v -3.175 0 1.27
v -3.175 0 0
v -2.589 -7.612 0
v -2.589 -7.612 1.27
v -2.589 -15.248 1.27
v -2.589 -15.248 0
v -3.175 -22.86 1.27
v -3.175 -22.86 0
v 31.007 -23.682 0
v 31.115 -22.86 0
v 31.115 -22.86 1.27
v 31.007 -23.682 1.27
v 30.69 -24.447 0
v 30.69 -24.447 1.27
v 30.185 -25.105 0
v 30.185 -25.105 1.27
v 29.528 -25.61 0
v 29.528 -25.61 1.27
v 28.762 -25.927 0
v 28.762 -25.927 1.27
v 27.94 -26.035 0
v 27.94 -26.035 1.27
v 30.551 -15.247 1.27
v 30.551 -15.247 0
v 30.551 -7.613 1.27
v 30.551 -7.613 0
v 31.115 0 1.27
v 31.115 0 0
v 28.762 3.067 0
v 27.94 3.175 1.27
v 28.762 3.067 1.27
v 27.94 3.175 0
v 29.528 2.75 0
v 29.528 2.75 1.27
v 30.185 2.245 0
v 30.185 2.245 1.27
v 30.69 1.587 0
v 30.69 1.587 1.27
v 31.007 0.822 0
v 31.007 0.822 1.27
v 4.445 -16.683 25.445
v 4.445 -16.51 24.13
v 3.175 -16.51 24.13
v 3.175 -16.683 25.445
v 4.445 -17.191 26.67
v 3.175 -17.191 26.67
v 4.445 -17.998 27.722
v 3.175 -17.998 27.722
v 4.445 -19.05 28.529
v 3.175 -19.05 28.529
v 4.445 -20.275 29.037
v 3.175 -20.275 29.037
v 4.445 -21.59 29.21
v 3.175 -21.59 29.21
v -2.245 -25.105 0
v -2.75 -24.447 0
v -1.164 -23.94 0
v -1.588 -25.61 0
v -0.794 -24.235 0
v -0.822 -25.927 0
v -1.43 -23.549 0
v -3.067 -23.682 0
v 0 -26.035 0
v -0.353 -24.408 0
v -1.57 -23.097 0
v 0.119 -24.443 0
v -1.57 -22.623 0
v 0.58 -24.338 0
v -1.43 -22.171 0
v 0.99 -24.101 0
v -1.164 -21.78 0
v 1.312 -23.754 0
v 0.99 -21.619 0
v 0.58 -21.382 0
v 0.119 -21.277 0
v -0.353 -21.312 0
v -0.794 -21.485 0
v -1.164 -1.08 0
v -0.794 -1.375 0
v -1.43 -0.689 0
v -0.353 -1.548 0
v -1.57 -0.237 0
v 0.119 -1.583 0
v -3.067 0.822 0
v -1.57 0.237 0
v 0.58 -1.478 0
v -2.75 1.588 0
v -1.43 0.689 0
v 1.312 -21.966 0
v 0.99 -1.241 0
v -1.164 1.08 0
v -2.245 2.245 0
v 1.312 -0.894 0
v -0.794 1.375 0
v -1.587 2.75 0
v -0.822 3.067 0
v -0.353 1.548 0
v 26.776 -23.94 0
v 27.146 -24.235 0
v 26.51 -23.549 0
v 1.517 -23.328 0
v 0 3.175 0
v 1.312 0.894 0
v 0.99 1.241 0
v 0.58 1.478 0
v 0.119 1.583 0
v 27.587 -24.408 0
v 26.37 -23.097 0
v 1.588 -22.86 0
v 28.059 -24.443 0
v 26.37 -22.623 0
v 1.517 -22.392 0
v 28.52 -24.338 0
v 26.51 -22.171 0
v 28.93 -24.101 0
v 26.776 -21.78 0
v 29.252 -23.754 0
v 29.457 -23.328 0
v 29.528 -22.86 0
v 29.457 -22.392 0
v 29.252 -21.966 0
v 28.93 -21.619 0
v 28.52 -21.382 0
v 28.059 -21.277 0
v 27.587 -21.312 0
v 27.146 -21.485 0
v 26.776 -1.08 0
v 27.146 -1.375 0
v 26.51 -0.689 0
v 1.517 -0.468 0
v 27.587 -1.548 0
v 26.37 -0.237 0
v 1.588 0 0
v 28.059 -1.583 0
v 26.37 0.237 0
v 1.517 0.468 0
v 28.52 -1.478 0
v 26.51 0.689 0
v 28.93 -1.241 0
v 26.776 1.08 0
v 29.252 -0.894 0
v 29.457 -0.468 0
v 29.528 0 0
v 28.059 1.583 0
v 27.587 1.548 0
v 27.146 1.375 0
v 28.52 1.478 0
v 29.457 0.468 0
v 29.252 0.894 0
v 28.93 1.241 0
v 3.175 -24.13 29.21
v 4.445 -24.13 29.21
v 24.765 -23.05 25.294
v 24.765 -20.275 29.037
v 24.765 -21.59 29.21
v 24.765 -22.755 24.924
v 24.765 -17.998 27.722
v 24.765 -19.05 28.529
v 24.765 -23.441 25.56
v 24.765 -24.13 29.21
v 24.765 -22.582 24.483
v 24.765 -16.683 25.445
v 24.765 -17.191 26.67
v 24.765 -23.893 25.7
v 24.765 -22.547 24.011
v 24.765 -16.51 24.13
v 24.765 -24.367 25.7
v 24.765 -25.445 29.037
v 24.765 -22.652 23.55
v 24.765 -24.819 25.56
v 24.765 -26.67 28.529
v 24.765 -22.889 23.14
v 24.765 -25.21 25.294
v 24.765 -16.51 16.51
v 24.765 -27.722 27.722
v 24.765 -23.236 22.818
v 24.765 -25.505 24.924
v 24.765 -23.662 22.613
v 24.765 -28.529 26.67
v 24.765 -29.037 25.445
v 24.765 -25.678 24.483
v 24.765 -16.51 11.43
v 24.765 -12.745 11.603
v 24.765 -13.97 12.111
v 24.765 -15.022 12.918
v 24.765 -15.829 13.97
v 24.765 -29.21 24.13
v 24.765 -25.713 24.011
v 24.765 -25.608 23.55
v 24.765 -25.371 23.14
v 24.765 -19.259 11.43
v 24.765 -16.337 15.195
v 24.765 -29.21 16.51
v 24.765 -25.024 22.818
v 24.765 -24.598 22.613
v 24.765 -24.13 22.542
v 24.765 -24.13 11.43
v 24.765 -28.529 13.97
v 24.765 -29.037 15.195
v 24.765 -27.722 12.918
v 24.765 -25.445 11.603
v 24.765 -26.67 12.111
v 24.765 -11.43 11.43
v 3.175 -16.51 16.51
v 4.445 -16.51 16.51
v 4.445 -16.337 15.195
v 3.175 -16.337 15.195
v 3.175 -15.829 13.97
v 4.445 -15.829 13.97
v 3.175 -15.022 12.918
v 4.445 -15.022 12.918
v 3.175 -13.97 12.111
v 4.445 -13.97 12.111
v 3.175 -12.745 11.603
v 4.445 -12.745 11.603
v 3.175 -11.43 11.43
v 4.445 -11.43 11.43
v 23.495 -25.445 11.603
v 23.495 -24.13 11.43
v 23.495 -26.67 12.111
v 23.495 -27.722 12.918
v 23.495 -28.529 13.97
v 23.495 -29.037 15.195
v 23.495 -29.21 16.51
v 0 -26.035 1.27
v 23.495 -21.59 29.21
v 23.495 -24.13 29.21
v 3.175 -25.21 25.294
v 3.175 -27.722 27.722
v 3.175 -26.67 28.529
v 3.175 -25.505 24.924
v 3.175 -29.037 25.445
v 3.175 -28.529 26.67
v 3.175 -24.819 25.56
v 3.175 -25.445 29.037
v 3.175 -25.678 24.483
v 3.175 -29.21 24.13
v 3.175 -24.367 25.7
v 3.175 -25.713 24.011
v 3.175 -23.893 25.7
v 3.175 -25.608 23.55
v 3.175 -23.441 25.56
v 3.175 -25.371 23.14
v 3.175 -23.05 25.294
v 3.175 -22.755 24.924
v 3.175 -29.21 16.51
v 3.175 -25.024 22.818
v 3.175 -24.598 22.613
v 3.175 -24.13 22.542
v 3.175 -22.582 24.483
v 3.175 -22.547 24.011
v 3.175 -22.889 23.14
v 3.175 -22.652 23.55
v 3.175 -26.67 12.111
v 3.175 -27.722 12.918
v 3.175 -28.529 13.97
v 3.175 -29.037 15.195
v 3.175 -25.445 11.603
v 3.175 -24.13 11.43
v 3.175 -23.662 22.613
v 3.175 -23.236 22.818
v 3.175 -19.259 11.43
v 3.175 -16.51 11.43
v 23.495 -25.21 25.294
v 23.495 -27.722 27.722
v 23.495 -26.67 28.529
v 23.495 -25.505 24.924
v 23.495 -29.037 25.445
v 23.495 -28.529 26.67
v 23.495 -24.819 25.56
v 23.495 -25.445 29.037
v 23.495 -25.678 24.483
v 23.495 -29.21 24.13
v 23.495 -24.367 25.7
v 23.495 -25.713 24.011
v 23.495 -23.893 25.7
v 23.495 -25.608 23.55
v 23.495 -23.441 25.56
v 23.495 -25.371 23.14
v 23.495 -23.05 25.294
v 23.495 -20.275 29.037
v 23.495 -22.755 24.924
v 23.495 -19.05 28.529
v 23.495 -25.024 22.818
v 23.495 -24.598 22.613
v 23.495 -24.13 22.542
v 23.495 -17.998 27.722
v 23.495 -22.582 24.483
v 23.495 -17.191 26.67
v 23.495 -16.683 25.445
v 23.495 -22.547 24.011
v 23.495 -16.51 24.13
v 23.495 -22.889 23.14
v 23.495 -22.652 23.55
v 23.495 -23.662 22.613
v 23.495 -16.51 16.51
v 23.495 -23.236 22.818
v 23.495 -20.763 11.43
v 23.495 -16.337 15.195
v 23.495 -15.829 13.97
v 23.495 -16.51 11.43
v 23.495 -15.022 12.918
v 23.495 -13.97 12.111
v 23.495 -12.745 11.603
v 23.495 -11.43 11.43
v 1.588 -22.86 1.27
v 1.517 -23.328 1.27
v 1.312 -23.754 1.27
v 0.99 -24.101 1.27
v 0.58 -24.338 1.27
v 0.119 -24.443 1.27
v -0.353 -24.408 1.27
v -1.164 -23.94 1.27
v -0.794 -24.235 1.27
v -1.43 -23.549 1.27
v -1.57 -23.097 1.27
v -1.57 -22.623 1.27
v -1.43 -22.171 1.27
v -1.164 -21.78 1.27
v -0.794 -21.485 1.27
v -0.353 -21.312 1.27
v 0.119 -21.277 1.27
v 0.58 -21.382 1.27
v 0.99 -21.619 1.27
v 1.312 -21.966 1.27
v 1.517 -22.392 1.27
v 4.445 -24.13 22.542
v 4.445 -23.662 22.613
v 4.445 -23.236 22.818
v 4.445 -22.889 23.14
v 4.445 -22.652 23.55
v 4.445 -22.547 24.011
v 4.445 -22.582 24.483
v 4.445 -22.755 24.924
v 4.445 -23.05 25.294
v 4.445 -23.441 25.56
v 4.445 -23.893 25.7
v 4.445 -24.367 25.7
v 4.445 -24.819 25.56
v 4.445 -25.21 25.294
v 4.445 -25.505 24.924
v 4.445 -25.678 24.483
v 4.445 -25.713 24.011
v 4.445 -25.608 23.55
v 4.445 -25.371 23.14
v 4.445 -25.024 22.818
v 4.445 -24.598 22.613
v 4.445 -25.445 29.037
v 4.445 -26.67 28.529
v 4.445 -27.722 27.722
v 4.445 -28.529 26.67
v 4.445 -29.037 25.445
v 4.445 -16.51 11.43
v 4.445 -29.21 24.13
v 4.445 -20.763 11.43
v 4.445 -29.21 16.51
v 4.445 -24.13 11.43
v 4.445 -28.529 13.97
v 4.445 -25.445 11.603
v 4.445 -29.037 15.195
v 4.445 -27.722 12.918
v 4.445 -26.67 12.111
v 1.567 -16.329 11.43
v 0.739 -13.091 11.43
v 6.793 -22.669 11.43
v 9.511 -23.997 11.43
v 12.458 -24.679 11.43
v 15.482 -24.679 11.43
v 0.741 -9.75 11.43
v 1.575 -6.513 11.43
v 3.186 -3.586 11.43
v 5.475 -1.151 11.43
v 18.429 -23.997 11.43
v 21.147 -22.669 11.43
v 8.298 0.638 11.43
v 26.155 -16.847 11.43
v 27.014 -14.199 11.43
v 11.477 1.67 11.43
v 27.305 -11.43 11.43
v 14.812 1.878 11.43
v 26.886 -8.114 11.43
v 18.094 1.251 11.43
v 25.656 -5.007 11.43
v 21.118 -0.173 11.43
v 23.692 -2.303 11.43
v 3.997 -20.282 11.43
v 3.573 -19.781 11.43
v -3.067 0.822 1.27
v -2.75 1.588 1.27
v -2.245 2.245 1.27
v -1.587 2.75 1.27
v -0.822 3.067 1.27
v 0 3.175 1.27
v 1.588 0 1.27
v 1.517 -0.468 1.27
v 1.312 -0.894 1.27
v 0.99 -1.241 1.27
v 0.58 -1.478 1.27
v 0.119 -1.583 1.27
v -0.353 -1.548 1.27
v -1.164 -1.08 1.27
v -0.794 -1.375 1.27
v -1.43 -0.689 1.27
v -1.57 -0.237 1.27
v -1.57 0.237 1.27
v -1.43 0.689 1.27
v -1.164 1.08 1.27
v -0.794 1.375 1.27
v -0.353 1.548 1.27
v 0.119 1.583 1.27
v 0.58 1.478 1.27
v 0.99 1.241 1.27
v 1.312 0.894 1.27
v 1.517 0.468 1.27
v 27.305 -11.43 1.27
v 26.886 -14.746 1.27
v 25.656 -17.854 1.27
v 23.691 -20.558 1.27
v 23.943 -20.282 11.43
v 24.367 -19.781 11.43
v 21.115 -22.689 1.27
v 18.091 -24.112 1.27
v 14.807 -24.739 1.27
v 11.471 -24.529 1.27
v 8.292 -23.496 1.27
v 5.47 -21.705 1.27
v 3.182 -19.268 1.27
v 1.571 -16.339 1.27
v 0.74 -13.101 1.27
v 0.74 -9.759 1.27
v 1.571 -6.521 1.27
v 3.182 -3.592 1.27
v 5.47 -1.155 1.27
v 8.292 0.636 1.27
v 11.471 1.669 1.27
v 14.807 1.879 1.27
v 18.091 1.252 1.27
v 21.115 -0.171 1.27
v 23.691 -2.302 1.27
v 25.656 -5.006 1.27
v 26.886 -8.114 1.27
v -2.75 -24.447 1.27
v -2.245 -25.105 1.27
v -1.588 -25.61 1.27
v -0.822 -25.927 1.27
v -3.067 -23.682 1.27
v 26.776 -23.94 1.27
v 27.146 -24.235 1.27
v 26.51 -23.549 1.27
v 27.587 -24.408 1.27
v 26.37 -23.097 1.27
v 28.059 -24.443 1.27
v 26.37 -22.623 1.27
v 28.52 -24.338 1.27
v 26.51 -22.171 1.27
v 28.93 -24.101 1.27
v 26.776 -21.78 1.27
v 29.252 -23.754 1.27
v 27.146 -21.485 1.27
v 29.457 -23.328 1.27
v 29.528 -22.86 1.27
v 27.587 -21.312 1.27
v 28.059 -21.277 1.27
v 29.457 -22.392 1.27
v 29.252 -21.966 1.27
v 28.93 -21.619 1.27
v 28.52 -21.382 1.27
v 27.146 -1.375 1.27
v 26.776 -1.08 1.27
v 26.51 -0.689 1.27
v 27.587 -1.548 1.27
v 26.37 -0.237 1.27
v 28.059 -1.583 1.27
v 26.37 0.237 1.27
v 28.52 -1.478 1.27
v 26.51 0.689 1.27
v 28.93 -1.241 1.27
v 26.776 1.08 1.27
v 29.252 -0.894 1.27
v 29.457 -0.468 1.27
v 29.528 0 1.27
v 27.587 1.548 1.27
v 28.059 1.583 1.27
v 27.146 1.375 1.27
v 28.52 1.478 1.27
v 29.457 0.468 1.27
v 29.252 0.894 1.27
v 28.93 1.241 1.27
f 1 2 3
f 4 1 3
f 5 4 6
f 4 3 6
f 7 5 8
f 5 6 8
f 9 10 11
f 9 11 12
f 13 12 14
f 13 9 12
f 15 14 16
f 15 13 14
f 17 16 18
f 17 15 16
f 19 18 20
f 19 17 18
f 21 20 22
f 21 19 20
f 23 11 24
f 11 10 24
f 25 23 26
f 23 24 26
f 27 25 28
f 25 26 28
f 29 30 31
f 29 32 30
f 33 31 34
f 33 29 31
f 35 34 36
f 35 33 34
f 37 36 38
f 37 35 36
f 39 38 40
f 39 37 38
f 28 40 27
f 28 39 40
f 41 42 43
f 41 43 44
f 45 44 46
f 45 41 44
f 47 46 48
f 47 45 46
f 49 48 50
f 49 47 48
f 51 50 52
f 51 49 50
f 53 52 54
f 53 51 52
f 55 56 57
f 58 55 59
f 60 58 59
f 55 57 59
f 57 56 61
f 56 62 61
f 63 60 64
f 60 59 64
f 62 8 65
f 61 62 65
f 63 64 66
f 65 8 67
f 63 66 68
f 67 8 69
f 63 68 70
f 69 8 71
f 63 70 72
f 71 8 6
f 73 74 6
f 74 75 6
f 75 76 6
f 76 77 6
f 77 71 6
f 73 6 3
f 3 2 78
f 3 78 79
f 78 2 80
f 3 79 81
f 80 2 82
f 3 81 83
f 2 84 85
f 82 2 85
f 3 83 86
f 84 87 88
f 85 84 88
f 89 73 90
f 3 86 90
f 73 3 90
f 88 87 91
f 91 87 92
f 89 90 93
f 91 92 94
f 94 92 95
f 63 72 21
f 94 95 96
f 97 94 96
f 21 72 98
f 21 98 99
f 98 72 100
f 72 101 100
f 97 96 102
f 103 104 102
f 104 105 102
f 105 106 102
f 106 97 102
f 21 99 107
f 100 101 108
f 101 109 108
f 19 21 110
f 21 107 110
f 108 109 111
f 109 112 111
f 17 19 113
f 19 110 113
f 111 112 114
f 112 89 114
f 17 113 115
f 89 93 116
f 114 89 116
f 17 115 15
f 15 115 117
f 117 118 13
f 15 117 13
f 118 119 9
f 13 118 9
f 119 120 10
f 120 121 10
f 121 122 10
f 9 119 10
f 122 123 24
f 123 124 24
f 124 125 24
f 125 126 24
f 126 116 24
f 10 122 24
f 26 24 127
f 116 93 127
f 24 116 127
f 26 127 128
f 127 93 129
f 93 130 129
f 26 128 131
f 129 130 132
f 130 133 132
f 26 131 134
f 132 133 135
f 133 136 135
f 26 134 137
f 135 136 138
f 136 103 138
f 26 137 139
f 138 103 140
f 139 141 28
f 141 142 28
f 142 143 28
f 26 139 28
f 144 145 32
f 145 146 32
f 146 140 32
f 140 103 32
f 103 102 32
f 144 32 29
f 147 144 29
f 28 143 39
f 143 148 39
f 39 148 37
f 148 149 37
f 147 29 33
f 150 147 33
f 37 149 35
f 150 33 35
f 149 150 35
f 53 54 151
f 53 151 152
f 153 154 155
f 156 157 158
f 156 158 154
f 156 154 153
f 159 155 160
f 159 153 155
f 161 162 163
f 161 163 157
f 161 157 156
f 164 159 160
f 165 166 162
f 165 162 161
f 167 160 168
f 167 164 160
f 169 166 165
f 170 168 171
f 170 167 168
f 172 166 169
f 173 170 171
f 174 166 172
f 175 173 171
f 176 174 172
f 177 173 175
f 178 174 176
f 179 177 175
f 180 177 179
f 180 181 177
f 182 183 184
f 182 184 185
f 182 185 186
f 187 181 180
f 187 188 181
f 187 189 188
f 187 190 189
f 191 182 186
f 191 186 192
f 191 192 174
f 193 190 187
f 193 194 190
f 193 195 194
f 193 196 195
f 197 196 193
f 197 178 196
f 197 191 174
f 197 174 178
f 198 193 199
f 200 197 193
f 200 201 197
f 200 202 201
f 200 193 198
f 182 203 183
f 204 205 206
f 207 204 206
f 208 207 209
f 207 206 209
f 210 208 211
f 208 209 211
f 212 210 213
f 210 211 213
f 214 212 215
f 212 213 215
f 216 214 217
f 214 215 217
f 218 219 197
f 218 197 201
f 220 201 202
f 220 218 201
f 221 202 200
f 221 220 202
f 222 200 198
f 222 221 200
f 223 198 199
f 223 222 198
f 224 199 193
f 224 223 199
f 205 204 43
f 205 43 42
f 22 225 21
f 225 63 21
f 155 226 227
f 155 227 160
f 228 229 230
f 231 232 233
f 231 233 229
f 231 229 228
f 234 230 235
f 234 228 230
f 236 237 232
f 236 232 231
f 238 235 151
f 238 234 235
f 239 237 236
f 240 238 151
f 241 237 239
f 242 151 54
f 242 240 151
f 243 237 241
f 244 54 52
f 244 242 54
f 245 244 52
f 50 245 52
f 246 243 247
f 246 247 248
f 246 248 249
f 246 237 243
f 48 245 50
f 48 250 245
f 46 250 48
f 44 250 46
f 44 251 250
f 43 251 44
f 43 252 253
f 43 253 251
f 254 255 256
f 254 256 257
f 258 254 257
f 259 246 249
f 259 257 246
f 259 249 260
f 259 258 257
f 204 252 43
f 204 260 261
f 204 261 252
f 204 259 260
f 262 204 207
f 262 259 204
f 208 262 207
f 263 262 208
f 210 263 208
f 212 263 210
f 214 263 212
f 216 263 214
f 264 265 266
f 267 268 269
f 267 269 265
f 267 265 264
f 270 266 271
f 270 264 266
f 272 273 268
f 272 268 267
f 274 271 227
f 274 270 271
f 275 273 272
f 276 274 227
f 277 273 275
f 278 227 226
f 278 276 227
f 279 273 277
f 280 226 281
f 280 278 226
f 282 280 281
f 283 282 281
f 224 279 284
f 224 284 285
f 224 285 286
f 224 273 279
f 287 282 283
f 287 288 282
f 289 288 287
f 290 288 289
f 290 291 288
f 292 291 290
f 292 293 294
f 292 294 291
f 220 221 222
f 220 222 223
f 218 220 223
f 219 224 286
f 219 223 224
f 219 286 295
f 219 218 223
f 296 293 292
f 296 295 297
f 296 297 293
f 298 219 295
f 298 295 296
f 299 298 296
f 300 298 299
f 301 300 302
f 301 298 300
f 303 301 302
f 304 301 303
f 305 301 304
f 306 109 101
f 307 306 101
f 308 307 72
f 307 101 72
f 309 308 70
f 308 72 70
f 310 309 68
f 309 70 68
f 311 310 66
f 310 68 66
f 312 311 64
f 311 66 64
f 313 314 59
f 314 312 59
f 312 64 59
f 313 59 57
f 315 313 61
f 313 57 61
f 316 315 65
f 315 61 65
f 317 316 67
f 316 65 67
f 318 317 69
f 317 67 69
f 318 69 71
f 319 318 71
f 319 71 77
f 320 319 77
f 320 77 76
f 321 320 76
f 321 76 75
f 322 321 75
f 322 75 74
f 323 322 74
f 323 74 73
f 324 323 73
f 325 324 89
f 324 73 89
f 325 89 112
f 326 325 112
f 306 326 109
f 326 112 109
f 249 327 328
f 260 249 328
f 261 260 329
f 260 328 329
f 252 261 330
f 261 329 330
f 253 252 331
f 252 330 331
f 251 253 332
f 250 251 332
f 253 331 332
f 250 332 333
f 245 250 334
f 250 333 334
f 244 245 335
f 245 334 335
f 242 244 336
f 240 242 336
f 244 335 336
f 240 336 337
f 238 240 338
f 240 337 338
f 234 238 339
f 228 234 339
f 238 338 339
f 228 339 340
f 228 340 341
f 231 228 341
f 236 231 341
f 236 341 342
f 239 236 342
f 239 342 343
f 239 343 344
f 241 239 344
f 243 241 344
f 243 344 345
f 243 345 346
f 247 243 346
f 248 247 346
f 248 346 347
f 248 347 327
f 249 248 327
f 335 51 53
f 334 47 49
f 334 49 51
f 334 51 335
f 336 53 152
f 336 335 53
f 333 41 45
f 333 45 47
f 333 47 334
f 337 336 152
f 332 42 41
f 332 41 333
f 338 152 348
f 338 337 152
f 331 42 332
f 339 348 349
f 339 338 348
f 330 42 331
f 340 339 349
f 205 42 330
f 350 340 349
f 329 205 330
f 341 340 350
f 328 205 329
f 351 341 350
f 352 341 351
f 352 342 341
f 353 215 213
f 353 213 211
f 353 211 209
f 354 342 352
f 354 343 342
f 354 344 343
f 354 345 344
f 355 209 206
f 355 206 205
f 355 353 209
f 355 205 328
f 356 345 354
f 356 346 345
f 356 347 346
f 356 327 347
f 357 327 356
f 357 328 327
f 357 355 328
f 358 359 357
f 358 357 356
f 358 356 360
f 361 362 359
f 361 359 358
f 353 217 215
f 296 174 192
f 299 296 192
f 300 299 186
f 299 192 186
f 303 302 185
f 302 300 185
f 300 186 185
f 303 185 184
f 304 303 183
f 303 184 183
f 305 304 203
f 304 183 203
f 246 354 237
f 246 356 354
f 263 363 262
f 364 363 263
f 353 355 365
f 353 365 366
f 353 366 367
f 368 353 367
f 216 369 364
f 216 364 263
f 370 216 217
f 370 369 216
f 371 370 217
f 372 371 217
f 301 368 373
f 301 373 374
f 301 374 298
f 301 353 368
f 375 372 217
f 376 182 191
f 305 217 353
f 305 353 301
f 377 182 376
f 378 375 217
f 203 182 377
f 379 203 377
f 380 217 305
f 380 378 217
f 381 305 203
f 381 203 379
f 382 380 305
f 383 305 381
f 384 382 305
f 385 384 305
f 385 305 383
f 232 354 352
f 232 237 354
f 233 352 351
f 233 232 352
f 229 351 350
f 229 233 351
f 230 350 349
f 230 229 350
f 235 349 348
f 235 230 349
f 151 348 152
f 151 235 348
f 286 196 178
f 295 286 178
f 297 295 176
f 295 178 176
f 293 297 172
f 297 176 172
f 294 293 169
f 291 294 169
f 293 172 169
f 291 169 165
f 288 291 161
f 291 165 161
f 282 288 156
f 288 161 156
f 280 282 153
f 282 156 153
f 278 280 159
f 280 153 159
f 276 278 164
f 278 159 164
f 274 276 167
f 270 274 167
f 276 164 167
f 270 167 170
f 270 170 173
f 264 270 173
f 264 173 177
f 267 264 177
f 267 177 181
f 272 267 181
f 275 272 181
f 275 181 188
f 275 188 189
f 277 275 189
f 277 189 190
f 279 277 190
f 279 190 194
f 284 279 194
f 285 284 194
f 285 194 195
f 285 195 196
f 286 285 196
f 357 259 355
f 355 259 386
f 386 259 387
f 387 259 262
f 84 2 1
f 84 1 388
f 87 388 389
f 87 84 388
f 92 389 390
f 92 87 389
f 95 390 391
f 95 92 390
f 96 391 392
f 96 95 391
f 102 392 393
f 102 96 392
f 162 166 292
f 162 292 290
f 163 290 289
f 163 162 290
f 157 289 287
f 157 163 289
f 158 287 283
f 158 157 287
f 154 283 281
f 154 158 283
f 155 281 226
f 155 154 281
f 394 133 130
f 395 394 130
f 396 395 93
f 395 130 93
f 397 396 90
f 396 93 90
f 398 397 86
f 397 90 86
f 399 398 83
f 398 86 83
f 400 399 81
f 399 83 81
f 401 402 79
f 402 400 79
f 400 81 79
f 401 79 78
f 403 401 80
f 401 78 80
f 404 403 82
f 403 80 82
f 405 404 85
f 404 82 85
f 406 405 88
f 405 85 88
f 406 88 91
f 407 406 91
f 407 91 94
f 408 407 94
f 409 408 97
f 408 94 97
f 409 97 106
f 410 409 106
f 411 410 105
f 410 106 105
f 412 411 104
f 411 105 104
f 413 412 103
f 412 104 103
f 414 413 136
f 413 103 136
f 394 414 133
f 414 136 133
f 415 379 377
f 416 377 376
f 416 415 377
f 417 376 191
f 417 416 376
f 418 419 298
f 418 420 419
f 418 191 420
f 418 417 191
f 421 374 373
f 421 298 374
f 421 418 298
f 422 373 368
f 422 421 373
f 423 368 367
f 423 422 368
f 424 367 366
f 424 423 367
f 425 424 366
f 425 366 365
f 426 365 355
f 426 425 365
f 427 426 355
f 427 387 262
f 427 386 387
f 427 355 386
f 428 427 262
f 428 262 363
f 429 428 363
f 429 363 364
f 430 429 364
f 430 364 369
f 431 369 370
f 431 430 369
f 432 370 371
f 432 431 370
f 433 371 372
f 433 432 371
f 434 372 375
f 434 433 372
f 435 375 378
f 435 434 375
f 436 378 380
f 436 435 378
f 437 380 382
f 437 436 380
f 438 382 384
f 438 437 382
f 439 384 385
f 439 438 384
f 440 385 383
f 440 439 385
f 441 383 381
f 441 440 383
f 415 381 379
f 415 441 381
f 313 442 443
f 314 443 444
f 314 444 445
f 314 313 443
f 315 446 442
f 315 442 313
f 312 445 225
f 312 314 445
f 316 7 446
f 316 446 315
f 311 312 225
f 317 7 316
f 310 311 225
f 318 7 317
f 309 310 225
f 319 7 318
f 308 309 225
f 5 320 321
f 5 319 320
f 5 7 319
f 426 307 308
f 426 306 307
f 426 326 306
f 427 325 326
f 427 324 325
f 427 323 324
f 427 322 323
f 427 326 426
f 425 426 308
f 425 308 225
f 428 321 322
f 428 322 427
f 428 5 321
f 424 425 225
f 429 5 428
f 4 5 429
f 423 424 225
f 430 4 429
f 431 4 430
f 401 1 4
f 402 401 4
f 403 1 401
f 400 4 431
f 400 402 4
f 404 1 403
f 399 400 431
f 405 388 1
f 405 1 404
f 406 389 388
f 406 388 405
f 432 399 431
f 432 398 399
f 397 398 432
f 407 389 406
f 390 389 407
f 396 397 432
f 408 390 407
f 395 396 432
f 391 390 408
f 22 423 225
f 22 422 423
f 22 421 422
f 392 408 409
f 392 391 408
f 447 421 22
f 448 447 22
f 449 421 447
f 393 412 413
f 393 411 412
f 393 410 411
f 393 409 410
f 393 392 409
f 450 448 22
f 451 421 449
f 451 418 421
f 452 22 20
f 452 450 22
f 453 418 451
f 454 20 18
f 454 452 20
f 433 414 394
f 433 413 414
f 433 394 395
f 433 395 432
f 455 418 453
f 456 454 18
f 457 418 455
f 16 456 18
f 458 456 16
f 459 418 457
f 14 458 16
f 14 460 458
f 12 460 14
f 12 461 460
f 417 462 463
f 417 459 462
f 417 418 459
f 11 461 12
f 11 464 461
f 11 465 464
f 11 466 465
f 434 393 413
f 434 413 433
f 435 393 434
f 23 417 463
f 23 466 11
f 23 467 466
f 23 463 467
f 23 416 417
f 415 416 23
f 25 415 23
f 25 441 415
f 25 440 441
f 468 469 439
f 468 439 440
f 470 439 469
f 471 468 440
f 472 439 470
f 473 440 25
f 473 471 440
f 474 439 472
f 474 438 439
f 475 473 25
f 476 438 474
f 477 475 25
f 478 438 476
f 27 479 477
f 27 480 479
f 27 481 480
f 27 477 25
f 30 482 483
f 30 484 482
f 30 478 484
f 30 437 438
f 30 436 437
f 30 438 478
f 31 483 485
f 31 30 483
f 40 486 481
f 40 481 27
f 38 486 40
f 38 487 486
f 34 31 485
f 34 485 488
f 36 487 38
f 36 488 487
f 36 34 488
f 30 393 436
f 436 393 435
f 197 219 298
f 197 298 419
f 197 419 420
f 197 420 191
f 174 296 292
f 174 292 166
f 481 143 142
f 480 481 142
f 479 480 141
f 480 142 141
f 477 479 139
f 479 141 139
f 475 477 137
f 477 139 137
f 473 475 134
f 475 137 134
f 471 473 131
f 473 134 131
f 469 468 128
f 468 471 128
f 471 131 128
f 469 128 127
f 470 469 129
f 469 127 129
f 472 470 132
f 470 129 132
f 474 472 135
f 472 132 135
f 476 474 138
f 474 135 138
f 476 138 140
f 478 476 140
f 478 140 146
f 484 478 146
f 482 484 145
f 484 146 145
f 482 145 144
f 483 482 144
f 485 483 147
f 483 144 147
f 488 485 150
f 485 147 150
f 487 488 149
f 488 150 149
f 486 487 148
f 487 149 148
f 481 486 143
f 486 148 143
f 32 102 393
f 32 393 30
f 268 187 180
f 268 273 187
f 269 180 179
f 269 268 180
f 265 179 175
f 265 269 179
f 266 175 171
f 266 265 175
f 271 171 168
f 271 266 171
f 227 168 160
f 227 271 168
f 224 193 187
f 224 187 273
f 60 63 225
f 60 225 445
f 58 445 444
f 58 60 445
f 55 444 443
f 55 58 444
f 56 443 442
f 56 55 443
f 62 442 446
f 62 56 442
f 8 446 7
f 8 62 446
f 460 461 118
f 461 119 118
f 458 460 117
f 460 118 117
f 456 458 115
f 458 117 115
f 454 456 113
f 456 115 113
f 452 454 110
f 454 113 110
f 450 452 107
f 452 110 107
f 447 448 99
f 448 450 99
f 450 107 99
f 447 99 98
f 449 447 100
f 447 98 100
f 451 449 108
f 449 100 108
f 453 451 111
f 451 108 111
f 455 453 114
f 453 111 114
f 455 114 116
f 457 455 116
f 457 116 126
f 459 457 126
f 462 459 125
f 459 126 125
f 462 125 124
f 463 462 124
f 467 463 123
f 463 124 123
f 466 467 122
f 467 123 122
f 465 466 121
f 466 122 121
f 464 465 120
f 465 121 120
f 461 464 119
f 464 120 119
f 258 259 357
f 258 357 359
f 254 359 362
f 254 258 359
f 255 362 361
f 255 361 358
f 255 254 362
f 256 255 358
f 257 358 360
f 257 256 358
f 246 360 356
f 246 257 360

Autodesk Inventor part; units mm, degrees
ref_plane "YZ Plane" through (0, 0, 0) normal (1, 0, 0) x (0, 1, 0)
ref_plane "XZ Plane" through (0, 0, 0) normal (0, 1, 0) x (-1, 0, 0)
ref_plane "XY Plane" through (0, 0, 0) normal (0, 0, 1) x (1, 0, 0)
sketch "Sketch1" plane through (0, 0, 0) normal (0, 0, 1) x (1, 0, 0)
  arc A0 (0, 3.175) -> (-3.175, 0) centre (0, 0) ccw
  arc A1 (-3.175, -22.86) -> (0, -26.035) centre (0, -22.86) ccw
  line L0 (0, -26.035) -> (27.94, -26.035)
  line L1 (0, 3.175) -> (27.94, 3.175)
  circle A2 centre (0, -22.86) radius 1.5875
  circle A3 centre (27.94, -22.86) radius 1.5875
  circle A4 centre (0, 0) radius 1.5875
  circle A5 centre (27.94, 0) radius 1.5875
  arc A6 (-3.175, -22.86) -> (-3.175, 0) centre (-101.9139, -11.43) ccw
  arc A7 (31.115, 0) -> (31.115, -22.86) centre (133.6675, -11.43) ccw
  arc A8 (27.94, -26.035) -> (31.115, -22.86) centre (27.94, -22.86) ccw
  arc A9 (31.115, 0) -> (27.94, 3.175) centre (27.94, 0) ccw
  point P0 (30.48, -11.43)
  point P1 (-2.54, -11.43)
  point P2 (-3.0961, -0.7033)
  dimension "d0" = 27.94
  dimension "d1" = 22.86
  dimension "d3" = 6.35
  dimension "d4" = 6.35
  dimension "d6" = 33.02
  dimension "d7" = 11.43
  dimension "d8" = 2.54
  dimension "d9" = 3.175
  dimension "d10" = 3.175
  dimension "d11" = 3.175
  dimension "d12" = 3.175
  dimension "d34" = 27.94
  dimension "d35" = 22.86
  dimension "d36" = 0
  dimension "d37" = 0
extrude "Extrusion1" add sketch "Sketch1" along normal blind 1.27
sketch "Sketch2" plane through (0, 0, 1.27) normal (0, 0, 1) x (1, 0, 0)
  circle A0 centre (13.97, -11.43) radius 13.335
  point P0 (0, 0)
  dimension "d15" = 26.67
  dimension "d16" = 13.97
  dimension "d17" = 11.43
extrude "Extrusion2" add sketch "Sketch2" along normal blind 10.16
sketch "Sketch3" plane through (13.97, -11.43, 11.43) normal (0, 0, 1) x (1, 0, 0)
  line L0 (9.525, -5.08) -> (10.795, -5.08)
  line L1 (10.795, -5.08) -> (10.795, -17.78)
  line L2 (10.795, -17.78) -> (9.525, -17.78)
  line L3 (9.525, -17.78) -> (9.525, -5.08)
  line L4 (-10.795, -5.08) -> (-9.525, -5.08)
  line L5 (-9.525, -5.08) -> (-9.525, -17.78)
  line L6 (-9.525, -17.78) -> (-10.795, -17.78)
  line L7 (-10.795, -17.78) -> (-10.795, -5.08)
  circle A0 centre (0, 0) radius 13.335 projected
  point P0 (-13.97, 11.43)
  point P1 (-13.335, 0)
  dimension "d20" = 19.05
  dimension "d21" = 1.27
  dimension "d22" = 1.27
  dimension "d23" = 3.81
  dimension "d24" = 5.08
  dimension "d25" = 12.7
extrude "Extrusion3" add sketch "Sketch3" along normal blind 17.78 contours L0 L1 A0 L3 | A0 L1 L2 L3 | A0 L7 L4 L5 | L5 L6 L7 A0
sketch "Sketch4" plane through (24.765, -29.21, 11.43) normal (1, 0, 0) x (0, 0, -1)
  line L0 (0, 0) -> (-17.78, 0) projected
  line L1 (-17.78, 0) -> (-17.78, 12.7) projected
  circle A0 centre (-12.7, 5.08) radius 1.5875
  point P0 (11.43, 29.21)
  dimension "d28" = 5.08
  dimension "d29" = 5.08
  dimension "d30" = 3.175
extrude "Extrusion4" cut sketch "Sketch4" against normal blind 50.8
fillet "Fillet1" radius 5.08 8 edges at (24.13, -29.21, 29.21) (3.81, -29.21, 29.21) (24.13, -16.51, 29.21) (3.81, -16.51, 29.21) (3.81, -16.51, 11.43) (24.13, -16.51, 11.43) (3.81, -29.21, 11.43) (24.13, -29.21, 11.43)
properties part number "CastorBase" material "Stainless Steel"
